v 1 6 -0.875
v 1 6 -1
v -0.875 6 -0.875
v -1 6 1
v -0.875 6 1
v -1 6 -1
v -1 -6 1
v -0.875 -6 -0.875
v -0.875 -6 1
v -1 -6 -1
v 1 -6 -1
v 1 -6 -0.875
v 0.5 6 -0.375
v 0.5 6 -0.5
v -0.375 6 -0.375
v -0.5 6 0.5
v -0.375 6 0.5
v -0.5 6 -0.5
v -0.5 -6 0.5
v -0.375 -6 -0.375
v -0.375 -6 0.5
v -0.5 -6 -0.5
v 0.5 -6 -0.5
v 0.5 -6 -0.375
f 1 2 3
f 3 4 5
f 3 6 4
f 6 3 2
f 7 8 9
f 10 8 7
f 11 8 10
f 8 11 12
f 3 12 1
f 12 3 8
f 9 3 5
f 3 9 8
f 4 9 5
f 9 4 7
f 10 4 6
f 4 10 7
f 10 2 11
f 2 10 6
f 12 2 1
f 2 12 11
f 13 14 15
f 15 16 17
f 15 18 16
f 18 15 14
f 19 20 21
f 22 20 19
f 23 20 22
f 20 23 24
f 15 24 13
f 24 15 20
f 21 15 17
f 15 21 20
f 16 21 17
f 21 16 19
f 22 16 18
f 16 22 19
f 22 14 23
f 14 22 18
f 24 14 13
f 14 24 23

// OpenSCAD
module AngleBracket(t=0.1, depth=12, w=2, h=2) {
    points = [
        [0, 0],
        [w, 0],
        [w, t],
        [t, t],
        [t, h],
        [0, h]
    ];
    translate([-w/2, 0, -h/2])
        rotate([90, 0, 0])
            linear_extrude(height=depth, center = true) {
                polygon(points);
        }
}

module AngleBracket2x2(depth=12) {
    // https://www.lowes.com/pd/Hillman-2-in-W-x-2-in-H-x-4-ft-L-Plain-Hot-Rolled-Steel-Solid-Angle/3059247
    t = 0.125;
    AngleBracket(t, depth, 2, 2);
}

module AngleBracket1x1(depth=12) {
    // https://www.lowes.com/pd/Hillman-1-in-W-x-1-in-H-x-3-ft-L-Plain-Hot-Rolled-Steel-Solid-Angle/3057607
    t = 0.125;
    AngleBracket(t, depth, 1, 1);
}

AngleBracket2x2();
AngleBracket1x1();
